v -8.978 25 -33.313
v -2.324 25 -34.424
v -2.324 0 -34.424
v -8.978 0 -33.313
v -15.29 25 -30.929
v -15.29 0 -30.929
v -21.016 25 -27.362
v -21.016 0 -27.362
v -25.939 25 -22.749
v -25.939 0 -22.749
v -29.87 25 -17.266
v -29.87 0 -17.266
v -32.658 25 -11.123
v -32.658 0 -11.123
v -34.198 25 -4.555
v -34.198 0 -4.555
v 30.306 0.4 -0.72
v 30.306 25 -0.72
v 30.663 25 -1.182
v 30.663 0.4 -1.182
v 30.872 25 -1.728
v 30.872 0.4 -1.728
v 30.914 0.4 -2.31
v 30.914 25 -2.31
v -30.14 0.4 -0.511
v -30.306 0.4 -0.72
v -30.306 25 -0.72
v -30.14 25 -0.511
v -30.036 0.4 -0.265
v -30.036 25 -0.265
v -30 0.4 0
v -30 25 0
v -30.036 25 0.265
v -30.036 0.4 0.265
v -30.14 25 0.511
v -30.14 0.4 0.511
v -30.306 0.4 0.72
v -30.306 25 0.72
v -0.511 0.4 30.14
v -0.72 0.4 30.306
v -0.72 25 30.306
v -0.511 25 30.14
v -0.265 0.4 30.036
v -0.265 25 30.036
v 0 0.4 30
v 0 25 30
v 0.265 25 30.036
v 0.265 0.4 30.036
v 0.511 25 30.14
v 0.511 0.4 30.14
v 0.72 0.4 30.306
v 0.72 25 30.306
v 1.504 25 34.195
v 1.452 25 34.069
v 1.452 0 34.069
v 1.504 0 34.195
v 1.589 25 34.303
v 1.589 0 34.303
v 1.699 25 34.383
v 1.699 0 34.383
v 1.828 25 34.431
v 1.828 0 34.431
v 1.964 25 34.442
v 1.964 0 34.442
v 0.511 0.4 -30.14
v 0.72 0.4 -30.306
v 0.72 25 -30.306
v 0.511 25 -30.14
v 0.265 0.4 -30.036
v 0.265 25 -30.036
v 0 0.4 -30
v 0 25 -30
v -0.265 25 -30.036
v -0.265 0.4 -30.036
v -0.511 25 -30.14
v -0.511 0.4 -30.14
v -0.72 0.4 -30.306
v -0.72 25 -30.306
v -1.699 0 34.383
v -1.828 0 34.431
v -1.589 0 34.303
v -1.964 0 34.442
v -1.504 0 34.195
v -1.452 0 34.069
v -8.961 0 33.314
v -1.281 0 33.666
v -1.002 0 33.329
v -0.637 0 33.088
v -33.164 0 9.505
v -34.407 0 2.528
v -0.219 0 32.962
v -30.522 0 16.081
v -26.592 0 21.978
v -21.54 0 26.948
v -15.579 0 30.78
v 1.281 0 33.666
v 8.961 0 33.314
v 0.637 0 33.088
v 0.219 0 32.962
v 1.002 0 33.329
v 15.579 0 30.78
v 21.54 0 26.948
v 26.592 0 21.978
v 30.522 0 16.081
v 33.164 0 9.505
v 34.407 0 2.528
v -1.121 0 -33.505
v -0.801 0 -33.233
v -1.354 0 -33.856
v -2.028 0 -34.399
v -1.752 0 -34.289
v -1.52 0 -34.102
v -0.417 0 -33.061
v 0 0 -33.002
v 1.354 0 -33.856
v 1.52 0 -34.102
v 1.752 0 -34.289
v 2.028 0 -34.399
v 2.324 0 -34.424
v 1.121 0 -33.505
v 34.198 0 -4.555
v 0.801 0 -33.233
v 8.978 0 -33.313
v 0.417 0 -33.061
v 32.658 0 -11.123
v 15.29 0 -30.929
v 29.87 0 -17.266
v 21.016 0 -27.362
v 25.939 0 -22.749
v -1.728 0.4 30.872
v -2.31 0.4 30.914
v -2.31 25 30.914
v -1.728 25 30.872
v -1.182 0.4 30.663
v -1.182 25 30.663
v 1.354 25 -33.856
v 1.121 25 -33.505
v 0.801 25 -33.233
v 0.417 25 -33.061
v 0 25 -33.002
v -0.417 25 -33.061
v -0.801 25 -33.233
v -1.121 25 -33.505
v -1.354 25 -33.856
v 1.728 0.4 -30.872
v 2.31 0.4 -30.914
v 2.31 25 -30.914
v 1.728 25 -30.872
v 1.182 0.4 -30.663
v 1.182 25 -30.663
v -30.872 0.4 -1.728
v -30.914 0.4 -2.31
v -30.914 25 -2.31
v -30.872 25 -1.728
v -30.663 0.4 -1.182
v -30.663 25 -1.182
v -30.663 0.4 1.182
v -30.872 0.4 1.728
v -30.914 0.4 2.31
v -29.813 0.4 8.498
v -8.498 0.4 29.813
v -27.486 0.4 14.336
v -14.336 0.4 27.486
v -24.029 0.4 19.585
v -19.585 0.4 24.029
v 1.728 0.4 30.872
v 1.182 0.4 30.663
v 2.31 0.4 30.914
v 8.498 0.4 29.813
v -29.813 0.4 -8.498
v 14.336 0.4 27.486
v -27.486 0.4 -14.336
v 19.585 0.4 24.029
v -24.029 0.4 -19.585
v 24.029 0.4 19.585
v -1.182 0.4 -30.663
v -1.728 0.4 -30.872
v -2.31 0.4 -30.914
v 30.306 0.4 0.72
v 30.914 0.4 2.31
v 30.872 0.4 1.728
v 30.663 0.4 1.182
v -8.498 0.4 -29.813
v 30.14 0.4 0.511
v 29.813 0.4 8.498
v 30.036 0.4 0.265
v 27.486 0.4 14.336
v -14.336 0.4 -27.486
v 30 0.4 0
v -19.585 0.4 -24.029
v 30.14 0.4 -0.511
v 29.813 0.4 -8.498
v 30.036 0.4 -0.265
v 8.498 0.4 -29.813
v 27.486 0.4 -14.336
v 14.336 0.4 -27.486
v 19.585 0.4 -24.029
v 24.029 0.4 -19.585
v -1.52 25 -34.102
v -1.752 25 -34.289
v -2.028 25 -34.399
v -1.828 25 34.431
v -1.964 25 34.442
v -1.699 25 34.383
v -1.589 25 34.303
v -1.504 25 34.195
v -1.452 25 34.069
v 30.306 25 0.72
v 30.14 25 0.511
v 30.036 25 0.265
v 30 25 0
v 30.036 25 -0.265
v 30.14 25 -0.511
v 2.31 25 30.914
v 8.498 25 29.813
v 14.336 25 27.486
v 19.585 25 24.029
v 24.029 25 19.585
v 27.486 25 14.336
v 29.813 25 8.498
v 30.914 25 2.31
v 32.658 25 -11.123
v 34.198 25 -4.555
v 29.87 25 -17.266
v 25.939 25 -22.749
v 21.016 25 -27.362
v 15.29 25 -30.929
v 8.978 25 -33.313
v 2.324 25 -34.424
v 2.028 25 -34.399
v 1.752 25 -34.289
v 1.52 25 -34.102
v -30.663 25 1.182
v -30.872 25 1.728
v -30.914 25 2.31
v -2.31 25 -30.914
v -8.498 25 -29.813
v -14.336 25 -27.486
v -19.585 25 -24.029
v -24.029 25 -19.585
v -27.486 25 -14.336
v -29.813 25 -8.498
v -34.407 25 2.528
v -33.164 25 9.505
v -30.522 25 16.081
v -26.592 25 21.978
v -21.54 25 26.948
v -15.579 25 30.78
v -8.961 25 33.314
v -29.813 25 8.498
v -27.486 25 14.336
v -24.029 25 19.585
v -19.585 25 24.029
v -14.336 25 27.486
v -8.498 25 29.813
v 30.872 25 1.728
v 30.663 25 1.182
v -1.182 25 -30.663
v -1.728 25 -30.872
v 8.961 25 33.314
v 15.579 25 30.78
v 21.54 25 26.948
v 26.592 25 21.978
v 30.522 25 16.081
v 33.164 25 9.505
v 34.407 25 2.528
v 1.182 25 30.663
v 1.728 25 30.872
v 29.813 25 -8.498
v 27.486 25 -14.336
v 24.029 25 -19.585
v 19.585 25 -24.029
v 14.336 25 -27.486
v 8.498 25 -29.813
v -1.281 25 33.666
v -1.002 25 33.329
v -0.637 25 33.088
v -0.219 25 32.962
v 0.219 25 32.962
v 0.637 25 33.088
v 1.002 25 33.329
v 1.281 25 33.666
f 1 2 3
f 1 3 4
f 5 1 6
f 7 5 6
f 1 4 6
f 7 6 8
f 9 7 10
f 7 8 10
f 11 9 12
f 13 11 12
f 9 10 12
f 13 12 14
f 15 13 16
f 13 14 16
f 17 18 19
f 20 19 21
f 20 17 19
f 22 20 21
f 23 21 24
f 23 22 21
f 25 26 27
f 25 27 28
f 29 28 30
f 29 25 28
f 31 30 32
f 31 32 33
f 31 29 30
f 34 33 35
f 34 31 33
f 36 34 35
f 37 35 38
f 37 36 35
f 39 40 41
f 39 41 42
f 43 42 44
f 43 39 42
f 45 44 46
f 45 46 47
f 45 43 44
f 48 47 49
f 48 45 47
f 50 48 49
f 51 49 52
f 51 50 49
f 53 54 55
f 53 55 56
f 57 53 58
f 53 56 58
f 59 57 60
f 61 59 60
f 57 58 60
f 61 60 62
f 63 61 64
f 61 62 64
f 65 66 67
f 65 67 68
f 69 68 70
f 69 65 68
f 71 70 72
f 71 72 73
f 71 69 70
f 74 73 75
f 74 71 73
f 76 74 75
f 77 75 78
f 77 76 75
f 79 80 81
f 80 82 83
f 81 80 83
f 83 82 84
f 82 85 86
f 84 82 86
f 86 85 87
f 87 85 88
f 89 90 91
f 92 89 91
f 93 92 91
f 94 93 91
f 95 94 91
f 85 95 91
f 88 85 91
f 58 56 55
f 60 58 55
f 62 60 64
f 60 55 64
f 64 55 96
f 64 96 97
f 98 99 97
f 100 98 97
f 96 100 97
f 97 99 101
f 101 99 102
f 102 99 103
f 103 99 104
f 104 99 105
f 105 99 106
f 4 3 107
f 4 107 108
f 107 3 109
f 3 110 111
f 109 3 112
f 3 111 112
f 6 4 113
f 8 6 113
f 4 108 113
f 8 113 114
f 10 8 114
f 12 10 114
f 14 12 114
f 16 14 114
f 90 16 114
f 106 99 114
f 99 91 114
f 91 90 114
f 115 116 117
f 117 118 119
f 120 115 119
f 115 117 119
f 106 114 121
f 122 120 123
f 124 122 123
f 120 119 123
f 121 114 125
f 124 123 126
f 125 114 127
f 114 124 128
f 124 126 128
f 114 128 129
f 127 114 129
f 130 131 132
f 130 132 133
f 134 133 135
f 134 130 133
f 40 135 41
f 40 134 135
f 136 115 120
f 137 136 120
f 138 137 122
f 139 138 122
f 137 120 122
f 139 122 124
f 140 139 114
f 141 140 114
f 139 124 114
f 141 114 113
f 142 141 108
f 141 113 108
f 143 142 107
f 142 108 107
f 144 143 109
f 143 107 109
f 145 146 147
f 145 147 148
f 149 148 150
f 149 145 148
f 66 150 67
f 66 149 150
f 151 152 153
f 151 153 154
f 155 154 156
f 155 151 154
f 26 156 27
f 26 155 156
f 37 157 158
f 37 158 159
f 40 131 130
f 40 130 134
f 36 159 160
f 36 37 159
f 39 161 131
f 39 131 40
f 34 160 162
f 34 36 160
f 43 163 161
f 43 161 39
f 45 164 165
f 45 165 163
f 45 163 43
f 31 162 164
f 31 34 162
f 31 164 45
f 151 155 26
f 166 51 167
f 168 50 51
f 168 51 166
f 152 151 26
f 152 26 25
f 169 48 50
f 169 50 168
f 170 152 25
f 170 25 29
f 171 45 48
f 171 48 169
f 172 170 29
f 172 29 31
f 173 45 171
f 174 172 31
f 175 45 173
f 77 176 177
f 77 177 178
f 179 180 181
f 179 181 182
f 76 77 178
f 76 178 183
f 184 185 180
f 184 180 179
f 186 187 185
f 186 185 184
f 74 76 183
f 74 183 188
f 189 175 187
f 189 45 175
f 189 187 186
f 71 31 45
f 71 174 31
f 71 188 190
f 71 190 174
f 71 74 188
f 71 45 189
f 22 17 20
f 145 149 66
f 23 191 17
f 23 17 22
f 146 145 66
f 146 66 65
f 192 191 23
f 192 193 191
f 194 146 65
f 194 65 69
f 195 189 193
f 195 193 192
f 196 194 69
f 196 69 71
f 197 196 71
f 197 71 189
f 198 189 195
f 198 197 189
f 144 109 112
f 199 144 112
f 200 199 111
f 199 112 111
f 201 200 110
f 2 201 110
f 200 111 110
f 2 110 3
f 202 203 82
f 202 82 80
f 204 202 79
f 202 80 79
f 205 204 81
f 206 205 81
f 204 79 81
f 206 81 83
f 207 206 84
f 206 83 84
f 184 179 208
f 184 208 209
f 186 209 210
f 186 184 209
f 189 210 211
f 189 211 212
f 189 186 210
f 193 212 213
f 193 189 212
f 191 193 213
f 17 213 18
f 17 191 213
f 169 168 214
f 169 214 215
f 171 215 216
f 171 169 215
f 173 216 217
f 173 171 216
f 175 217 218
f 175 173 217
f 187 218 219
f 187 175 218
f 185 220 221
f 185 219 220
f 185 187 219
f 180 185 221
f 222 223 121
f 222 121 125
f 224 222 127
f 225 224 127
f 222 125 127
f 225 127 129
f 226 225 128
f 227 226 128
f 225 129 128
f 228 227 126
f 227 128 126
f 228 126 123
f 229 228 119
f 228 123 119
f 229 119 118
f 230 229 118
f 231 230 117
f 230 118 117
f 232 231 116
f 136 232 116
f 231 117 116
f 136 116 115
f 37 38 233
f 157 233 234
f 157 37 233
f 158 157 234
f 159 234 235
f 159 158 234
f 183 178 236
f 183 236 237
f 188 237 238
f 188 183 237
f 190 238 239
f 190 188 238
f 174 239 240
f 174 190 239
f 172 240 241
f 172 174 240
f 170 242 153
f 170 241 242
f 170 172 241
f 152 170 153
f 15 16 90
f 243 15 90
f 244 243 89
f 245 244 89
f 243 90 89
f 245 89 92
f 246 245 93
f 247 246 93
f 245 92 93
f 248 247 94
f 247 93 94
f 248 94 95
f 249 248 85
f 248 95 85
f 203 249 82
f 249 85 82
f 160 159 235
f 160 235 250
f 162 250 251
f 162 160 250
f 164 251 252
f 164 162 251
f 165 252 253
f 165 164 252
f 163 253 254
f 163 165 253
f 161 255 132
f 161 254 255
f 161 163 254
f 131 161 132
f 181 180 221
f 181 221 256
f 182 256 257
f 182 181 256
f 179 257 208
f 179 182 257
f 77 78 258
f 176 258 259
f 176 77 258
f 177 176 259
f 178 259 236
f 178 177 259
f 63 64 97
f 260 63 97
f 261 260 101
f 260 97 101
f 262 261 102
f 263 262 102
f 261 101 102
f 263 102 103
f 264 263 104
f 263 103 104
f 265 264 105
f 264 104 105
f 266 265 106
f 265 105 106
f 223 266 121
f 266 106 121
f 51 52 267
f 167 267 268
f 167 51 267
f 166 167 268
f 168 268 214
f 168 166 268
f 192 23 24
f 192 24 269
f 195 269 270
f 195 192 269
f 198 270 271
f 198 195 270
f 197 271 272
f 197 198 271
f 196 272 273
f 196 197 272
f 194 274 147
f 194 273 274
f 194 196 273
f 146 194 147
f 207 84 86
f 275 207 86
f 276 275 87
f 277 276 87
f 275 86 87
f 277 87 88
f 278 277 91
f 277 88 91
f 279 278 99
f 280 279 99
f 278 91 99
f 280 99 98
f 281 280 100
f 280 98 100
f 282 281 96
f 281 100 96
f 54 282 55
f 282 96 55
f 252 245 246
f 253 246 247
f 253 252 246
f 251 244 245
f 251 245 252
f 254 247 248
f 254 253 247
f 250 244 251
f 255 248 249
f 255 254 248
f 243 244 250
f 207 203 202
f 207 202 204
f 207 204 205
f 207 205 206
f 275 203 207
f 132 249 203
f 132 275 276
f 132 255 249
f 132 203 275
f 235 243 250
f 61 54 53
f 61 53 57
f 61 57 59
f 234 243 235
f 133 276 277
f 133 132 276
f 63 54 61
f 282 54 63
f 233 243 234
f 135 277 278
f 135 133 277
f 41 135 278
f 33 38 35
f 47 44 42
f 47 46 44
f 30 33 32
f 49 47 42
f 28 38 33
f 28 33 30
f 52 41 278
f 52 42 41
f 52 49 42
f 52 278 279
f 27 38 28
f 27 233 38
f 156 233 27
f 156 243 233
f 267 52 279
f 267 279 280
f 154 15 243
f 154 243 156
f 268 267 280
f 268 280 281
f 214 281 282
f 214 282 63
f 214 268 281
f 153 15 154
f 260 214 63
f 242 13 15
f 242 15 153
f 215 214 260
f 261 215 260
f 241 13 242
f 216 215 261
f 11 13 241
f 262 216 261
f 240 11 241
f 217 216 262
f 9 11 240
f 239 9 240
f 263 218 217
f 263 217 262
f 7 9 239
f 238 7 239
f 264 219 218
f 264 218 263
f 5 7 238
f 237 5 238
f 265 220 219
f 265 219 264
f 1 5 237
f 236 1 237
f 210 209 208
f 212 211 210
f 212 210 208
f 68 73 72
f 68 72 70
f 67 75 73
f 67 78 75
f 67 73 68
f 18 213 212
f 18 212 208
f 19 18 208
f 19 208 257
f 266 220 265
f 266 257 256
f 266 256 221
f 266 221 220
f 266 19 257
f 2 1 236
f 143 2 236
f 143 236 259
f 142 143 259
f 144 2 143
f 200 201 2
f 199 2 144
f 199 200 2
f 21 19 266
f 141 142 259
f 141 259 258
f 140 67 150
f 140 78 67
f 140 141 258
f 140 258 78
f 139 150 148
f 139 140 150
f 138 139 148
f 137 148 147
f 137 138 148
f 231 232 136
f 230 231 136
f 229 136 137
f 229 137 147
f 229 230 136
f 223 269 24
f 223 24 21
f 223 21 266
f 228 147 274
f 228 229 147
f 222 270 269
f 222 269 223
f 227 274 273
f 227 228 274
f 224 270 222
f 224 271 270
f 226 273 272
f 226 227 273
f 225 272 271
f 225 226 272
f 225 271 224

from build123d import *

# Parameters (mm, degrees)
BOSS_EXTRUDE1_DEPTH = 25
CUT_EXTRUDE2_DEPTH  = 26
BOSS_EXTRUDE2_DEPTH = 0.4


with BuildPart() as part:
    # Sketch1 → Boss-Extrude1 (new body)
    with BuildSketch(Plane(origin=(0, 0, 0), x_dir=(1, 0, 0), z_dir=(0, 1, 0))):
        with BuildLine():
            ThreePointArc((1.451818925, -34.068556857), (1.641248992, -34.346908706), (1.964225605, -34.442038138))
            ThreePointArc((1.964225605, -34.442038138), (26.591847487, -21.978073076), (34.198225299, 4.555174015))
            ThreePointArc((34.198225299, 4.555174015), (23.590291339, 25.176355888), (2.324135821, 34.423627607))
            ThreePointArc((2.324135821, 34.423627607), (1.751838249, 34.289058819), (1.354061739, 33.856153382))
            ThreePointArc((1.354061739, 33.856153382), (0, 33.001534515), (-1.354061739, 33.856153382))
            ThreePointArc((-1.354061739, 33.856153382), (-1.751838249, 34.289058819), (-2.324135821, 34.423627607))
            ThreePointArc((-2.324135821, 34.423627607), (-23.590291339, 25.176355888), (-34.198225299, 4.555174015))
            ThreePointArc((-34.198225299, 4.555174015), (-26.591847487, -21.978073076), (-1.964225605, -34.442038138))
            ThreePointArc((-1.964225605, -34.442038138), (-1.641248992, -34.346908706), (-1.451818925, -34.068556857))
            ThreePointArc((-1.451818925, -34.068556857), (0, -32.945679925), (1.451818925, -34.068556857))
        make_face()
        with BuildLine():
            Line((-2.417, 3.787737139), (0, 3.787737139))
            Line((0, 3.787737139), (2.417, 3.787737139))
            ThreePointArc((2.417, 3.787737139), (0, -4.489512172), (-2.417, 3.787737139))
        make_face(mode=Mode.SUBTRACT)
    extrude(amount=BOSS_EXTRUDE1_DEPTH)

    # Sketch2 → Cut-Extrude2 (cut, through all)
    with BuildSketch(Plane(origin=(0, 0, 0), x_dir=(1, 0, 0), z_dir=(0, 1, 0))):
        with BuildLine():
            ThreePointArc((-30.913793103, -2.310280493), (-21.920310217, -21.920310217), (-2.310280493, -30.913793103))
            ThreePointArc((-2.310280493, -30.913793103), (-1.447519283, -30.787674087), (-0.720410046, -30.306451613))
            ThreePointArc((-0.720410046, -30.306451613), (0, -30), (0.720410046, -30.306451613))
            ThreePointArc((0.720410046, -30.306451613), (1.447519283, -30.787674087), (2.310280493, -30.913793103))
            ThreePointArc((2.310280493, -30.913793103), (21.920310217, -21.920310217), (30.913793103, -2.310280493))
            ThreePointArc((30.913793103, -2.310280493), (30.787674087, -1.447519283), (30.306451613, -0.720410046))
            ThreePointArc((30.306451613, -0.720410046), (30, 0), (30.306451613, 0.720410046))
            ThreePointArc((30.306451613, 0.720410046), (30.787674087, 1.447519283), (30.913793103, 2.310280493))
            ThreePointArc((30.913793103, 2.310280493), (21.920310217, 21.920310217), (2.310280493, 30.913793103))
            ThreePointArc((2.310280493, 30.913793103), (1.447519283, 30.787674087), (0.720410046, 30.306451613))
            ThreePointArc((0.720410046, 30.306451613), (0, 30), (-0.720410046, 30.306451613))
            ThreePointArc((-0.720410046, 30.306451613), (-1.447519283, 30.787674087), (-2.310280493, 30.913793103))
            ThreePointArc((-2.310280493, 30.913793103), (-21.920310217, 21.920310217), (-30.913793103, 2.310280493))
            ThreePointArc((-30.913793103, 2.310280493), (-30.787674087, 1.447519283), (-30.306451613, 0.720410046))
            ThreePointArc((-30.306451613, 0.720410046), (-30, 0), (-30.306451613, -0.720410046))
            ThreePointArc((-30.306451613, -0.720410046), (-30.787674087, -1.447519283), (-30.913793103, -2.310280493))
        make_face()
    extrude(amount=CUT_EXTRUDE2_DEPTH, mode=Mode.SUBTRACT)

    # Sketch2<2> → Boss-Extrude2 (add)
    with BuildSketch(Plane(origin=(0, 0, 0), x_dir=(1, 0, 0), z_dir=(0, 1, 0))):
        with BuildLine():
            ThreePointArc((-30.913793103, -2.310280493), (-21.920310217, -21.920310217), (-2.310280493, -30.913793103))
            ThreePointArc((-2.310280493, -30.913793103), (-1.447519283, -30.787674087), (-0.720410046, -30.306451613))
            ThreePointArc((-0.720410046, -30.306451613), (0, -30), (0.720410046, -30.306451613))
            ThreePointArc((0.720410046, -30.306451613), (1.447519283, -30.787674087), (2.310280493, -30.913793103))
            ThreePointArc((2.310280493, -30.913793103), (21.920310217, -21.920310217), (30.913793103, -2.310280493))
            ThreePointArc((30.913793103, -2.310280493), (30.787674087, -1.447519283), (30.306451613, -0.720410046))
            ThreePointArc((30.306451613, -0.720410046), (30, 0), (30.306451613, 0.720410046))
            ThreePointArc((30.306451613, 0.720410046), (30.787674087, 1.447519283), (30.913793103, 2.310280493))
            ThreePointArc((30.913793103, 2.310280493), (21.920310217, 21.920310217), (2.310280493, 30.913793103))
            ThreePointArc((2.310280493, 30.913793103), (1.447519283, 30.787674087), (0.720410046, 30.306451613))
            ThreePointArc((0.720410046, 30.306451613), (0, 30), (-0.720410046, 30.306451613))
            ThreePointArc((-0.720410046, 30.306451613), (-1.447519283, 30.787674087), (-2.310280493, 30.913793103))
            ThreePointArc((-2.310280493, 30.913793103), (-21.920310217, 21.920310217), (-30.913793103, 2.310280493))
            ThreePointArc((-30.913793103, 2.310280493), (-30.787674087, 1.447519283), (-30.306451613, 0.720410046))
            ThreePointArc((-30.306451613, 0.720410046), (-30, 0), (-30.306451613, -0.720410046))
            ThreePointArc((-30.306451613, -0.720410046), (-30.787674087, -1.447519283), (-30.913793103, -2.310280493))
        make_face()
    extrude(amount=BOSS_EXTRUDE2_DEPTH)


solid = part.part
